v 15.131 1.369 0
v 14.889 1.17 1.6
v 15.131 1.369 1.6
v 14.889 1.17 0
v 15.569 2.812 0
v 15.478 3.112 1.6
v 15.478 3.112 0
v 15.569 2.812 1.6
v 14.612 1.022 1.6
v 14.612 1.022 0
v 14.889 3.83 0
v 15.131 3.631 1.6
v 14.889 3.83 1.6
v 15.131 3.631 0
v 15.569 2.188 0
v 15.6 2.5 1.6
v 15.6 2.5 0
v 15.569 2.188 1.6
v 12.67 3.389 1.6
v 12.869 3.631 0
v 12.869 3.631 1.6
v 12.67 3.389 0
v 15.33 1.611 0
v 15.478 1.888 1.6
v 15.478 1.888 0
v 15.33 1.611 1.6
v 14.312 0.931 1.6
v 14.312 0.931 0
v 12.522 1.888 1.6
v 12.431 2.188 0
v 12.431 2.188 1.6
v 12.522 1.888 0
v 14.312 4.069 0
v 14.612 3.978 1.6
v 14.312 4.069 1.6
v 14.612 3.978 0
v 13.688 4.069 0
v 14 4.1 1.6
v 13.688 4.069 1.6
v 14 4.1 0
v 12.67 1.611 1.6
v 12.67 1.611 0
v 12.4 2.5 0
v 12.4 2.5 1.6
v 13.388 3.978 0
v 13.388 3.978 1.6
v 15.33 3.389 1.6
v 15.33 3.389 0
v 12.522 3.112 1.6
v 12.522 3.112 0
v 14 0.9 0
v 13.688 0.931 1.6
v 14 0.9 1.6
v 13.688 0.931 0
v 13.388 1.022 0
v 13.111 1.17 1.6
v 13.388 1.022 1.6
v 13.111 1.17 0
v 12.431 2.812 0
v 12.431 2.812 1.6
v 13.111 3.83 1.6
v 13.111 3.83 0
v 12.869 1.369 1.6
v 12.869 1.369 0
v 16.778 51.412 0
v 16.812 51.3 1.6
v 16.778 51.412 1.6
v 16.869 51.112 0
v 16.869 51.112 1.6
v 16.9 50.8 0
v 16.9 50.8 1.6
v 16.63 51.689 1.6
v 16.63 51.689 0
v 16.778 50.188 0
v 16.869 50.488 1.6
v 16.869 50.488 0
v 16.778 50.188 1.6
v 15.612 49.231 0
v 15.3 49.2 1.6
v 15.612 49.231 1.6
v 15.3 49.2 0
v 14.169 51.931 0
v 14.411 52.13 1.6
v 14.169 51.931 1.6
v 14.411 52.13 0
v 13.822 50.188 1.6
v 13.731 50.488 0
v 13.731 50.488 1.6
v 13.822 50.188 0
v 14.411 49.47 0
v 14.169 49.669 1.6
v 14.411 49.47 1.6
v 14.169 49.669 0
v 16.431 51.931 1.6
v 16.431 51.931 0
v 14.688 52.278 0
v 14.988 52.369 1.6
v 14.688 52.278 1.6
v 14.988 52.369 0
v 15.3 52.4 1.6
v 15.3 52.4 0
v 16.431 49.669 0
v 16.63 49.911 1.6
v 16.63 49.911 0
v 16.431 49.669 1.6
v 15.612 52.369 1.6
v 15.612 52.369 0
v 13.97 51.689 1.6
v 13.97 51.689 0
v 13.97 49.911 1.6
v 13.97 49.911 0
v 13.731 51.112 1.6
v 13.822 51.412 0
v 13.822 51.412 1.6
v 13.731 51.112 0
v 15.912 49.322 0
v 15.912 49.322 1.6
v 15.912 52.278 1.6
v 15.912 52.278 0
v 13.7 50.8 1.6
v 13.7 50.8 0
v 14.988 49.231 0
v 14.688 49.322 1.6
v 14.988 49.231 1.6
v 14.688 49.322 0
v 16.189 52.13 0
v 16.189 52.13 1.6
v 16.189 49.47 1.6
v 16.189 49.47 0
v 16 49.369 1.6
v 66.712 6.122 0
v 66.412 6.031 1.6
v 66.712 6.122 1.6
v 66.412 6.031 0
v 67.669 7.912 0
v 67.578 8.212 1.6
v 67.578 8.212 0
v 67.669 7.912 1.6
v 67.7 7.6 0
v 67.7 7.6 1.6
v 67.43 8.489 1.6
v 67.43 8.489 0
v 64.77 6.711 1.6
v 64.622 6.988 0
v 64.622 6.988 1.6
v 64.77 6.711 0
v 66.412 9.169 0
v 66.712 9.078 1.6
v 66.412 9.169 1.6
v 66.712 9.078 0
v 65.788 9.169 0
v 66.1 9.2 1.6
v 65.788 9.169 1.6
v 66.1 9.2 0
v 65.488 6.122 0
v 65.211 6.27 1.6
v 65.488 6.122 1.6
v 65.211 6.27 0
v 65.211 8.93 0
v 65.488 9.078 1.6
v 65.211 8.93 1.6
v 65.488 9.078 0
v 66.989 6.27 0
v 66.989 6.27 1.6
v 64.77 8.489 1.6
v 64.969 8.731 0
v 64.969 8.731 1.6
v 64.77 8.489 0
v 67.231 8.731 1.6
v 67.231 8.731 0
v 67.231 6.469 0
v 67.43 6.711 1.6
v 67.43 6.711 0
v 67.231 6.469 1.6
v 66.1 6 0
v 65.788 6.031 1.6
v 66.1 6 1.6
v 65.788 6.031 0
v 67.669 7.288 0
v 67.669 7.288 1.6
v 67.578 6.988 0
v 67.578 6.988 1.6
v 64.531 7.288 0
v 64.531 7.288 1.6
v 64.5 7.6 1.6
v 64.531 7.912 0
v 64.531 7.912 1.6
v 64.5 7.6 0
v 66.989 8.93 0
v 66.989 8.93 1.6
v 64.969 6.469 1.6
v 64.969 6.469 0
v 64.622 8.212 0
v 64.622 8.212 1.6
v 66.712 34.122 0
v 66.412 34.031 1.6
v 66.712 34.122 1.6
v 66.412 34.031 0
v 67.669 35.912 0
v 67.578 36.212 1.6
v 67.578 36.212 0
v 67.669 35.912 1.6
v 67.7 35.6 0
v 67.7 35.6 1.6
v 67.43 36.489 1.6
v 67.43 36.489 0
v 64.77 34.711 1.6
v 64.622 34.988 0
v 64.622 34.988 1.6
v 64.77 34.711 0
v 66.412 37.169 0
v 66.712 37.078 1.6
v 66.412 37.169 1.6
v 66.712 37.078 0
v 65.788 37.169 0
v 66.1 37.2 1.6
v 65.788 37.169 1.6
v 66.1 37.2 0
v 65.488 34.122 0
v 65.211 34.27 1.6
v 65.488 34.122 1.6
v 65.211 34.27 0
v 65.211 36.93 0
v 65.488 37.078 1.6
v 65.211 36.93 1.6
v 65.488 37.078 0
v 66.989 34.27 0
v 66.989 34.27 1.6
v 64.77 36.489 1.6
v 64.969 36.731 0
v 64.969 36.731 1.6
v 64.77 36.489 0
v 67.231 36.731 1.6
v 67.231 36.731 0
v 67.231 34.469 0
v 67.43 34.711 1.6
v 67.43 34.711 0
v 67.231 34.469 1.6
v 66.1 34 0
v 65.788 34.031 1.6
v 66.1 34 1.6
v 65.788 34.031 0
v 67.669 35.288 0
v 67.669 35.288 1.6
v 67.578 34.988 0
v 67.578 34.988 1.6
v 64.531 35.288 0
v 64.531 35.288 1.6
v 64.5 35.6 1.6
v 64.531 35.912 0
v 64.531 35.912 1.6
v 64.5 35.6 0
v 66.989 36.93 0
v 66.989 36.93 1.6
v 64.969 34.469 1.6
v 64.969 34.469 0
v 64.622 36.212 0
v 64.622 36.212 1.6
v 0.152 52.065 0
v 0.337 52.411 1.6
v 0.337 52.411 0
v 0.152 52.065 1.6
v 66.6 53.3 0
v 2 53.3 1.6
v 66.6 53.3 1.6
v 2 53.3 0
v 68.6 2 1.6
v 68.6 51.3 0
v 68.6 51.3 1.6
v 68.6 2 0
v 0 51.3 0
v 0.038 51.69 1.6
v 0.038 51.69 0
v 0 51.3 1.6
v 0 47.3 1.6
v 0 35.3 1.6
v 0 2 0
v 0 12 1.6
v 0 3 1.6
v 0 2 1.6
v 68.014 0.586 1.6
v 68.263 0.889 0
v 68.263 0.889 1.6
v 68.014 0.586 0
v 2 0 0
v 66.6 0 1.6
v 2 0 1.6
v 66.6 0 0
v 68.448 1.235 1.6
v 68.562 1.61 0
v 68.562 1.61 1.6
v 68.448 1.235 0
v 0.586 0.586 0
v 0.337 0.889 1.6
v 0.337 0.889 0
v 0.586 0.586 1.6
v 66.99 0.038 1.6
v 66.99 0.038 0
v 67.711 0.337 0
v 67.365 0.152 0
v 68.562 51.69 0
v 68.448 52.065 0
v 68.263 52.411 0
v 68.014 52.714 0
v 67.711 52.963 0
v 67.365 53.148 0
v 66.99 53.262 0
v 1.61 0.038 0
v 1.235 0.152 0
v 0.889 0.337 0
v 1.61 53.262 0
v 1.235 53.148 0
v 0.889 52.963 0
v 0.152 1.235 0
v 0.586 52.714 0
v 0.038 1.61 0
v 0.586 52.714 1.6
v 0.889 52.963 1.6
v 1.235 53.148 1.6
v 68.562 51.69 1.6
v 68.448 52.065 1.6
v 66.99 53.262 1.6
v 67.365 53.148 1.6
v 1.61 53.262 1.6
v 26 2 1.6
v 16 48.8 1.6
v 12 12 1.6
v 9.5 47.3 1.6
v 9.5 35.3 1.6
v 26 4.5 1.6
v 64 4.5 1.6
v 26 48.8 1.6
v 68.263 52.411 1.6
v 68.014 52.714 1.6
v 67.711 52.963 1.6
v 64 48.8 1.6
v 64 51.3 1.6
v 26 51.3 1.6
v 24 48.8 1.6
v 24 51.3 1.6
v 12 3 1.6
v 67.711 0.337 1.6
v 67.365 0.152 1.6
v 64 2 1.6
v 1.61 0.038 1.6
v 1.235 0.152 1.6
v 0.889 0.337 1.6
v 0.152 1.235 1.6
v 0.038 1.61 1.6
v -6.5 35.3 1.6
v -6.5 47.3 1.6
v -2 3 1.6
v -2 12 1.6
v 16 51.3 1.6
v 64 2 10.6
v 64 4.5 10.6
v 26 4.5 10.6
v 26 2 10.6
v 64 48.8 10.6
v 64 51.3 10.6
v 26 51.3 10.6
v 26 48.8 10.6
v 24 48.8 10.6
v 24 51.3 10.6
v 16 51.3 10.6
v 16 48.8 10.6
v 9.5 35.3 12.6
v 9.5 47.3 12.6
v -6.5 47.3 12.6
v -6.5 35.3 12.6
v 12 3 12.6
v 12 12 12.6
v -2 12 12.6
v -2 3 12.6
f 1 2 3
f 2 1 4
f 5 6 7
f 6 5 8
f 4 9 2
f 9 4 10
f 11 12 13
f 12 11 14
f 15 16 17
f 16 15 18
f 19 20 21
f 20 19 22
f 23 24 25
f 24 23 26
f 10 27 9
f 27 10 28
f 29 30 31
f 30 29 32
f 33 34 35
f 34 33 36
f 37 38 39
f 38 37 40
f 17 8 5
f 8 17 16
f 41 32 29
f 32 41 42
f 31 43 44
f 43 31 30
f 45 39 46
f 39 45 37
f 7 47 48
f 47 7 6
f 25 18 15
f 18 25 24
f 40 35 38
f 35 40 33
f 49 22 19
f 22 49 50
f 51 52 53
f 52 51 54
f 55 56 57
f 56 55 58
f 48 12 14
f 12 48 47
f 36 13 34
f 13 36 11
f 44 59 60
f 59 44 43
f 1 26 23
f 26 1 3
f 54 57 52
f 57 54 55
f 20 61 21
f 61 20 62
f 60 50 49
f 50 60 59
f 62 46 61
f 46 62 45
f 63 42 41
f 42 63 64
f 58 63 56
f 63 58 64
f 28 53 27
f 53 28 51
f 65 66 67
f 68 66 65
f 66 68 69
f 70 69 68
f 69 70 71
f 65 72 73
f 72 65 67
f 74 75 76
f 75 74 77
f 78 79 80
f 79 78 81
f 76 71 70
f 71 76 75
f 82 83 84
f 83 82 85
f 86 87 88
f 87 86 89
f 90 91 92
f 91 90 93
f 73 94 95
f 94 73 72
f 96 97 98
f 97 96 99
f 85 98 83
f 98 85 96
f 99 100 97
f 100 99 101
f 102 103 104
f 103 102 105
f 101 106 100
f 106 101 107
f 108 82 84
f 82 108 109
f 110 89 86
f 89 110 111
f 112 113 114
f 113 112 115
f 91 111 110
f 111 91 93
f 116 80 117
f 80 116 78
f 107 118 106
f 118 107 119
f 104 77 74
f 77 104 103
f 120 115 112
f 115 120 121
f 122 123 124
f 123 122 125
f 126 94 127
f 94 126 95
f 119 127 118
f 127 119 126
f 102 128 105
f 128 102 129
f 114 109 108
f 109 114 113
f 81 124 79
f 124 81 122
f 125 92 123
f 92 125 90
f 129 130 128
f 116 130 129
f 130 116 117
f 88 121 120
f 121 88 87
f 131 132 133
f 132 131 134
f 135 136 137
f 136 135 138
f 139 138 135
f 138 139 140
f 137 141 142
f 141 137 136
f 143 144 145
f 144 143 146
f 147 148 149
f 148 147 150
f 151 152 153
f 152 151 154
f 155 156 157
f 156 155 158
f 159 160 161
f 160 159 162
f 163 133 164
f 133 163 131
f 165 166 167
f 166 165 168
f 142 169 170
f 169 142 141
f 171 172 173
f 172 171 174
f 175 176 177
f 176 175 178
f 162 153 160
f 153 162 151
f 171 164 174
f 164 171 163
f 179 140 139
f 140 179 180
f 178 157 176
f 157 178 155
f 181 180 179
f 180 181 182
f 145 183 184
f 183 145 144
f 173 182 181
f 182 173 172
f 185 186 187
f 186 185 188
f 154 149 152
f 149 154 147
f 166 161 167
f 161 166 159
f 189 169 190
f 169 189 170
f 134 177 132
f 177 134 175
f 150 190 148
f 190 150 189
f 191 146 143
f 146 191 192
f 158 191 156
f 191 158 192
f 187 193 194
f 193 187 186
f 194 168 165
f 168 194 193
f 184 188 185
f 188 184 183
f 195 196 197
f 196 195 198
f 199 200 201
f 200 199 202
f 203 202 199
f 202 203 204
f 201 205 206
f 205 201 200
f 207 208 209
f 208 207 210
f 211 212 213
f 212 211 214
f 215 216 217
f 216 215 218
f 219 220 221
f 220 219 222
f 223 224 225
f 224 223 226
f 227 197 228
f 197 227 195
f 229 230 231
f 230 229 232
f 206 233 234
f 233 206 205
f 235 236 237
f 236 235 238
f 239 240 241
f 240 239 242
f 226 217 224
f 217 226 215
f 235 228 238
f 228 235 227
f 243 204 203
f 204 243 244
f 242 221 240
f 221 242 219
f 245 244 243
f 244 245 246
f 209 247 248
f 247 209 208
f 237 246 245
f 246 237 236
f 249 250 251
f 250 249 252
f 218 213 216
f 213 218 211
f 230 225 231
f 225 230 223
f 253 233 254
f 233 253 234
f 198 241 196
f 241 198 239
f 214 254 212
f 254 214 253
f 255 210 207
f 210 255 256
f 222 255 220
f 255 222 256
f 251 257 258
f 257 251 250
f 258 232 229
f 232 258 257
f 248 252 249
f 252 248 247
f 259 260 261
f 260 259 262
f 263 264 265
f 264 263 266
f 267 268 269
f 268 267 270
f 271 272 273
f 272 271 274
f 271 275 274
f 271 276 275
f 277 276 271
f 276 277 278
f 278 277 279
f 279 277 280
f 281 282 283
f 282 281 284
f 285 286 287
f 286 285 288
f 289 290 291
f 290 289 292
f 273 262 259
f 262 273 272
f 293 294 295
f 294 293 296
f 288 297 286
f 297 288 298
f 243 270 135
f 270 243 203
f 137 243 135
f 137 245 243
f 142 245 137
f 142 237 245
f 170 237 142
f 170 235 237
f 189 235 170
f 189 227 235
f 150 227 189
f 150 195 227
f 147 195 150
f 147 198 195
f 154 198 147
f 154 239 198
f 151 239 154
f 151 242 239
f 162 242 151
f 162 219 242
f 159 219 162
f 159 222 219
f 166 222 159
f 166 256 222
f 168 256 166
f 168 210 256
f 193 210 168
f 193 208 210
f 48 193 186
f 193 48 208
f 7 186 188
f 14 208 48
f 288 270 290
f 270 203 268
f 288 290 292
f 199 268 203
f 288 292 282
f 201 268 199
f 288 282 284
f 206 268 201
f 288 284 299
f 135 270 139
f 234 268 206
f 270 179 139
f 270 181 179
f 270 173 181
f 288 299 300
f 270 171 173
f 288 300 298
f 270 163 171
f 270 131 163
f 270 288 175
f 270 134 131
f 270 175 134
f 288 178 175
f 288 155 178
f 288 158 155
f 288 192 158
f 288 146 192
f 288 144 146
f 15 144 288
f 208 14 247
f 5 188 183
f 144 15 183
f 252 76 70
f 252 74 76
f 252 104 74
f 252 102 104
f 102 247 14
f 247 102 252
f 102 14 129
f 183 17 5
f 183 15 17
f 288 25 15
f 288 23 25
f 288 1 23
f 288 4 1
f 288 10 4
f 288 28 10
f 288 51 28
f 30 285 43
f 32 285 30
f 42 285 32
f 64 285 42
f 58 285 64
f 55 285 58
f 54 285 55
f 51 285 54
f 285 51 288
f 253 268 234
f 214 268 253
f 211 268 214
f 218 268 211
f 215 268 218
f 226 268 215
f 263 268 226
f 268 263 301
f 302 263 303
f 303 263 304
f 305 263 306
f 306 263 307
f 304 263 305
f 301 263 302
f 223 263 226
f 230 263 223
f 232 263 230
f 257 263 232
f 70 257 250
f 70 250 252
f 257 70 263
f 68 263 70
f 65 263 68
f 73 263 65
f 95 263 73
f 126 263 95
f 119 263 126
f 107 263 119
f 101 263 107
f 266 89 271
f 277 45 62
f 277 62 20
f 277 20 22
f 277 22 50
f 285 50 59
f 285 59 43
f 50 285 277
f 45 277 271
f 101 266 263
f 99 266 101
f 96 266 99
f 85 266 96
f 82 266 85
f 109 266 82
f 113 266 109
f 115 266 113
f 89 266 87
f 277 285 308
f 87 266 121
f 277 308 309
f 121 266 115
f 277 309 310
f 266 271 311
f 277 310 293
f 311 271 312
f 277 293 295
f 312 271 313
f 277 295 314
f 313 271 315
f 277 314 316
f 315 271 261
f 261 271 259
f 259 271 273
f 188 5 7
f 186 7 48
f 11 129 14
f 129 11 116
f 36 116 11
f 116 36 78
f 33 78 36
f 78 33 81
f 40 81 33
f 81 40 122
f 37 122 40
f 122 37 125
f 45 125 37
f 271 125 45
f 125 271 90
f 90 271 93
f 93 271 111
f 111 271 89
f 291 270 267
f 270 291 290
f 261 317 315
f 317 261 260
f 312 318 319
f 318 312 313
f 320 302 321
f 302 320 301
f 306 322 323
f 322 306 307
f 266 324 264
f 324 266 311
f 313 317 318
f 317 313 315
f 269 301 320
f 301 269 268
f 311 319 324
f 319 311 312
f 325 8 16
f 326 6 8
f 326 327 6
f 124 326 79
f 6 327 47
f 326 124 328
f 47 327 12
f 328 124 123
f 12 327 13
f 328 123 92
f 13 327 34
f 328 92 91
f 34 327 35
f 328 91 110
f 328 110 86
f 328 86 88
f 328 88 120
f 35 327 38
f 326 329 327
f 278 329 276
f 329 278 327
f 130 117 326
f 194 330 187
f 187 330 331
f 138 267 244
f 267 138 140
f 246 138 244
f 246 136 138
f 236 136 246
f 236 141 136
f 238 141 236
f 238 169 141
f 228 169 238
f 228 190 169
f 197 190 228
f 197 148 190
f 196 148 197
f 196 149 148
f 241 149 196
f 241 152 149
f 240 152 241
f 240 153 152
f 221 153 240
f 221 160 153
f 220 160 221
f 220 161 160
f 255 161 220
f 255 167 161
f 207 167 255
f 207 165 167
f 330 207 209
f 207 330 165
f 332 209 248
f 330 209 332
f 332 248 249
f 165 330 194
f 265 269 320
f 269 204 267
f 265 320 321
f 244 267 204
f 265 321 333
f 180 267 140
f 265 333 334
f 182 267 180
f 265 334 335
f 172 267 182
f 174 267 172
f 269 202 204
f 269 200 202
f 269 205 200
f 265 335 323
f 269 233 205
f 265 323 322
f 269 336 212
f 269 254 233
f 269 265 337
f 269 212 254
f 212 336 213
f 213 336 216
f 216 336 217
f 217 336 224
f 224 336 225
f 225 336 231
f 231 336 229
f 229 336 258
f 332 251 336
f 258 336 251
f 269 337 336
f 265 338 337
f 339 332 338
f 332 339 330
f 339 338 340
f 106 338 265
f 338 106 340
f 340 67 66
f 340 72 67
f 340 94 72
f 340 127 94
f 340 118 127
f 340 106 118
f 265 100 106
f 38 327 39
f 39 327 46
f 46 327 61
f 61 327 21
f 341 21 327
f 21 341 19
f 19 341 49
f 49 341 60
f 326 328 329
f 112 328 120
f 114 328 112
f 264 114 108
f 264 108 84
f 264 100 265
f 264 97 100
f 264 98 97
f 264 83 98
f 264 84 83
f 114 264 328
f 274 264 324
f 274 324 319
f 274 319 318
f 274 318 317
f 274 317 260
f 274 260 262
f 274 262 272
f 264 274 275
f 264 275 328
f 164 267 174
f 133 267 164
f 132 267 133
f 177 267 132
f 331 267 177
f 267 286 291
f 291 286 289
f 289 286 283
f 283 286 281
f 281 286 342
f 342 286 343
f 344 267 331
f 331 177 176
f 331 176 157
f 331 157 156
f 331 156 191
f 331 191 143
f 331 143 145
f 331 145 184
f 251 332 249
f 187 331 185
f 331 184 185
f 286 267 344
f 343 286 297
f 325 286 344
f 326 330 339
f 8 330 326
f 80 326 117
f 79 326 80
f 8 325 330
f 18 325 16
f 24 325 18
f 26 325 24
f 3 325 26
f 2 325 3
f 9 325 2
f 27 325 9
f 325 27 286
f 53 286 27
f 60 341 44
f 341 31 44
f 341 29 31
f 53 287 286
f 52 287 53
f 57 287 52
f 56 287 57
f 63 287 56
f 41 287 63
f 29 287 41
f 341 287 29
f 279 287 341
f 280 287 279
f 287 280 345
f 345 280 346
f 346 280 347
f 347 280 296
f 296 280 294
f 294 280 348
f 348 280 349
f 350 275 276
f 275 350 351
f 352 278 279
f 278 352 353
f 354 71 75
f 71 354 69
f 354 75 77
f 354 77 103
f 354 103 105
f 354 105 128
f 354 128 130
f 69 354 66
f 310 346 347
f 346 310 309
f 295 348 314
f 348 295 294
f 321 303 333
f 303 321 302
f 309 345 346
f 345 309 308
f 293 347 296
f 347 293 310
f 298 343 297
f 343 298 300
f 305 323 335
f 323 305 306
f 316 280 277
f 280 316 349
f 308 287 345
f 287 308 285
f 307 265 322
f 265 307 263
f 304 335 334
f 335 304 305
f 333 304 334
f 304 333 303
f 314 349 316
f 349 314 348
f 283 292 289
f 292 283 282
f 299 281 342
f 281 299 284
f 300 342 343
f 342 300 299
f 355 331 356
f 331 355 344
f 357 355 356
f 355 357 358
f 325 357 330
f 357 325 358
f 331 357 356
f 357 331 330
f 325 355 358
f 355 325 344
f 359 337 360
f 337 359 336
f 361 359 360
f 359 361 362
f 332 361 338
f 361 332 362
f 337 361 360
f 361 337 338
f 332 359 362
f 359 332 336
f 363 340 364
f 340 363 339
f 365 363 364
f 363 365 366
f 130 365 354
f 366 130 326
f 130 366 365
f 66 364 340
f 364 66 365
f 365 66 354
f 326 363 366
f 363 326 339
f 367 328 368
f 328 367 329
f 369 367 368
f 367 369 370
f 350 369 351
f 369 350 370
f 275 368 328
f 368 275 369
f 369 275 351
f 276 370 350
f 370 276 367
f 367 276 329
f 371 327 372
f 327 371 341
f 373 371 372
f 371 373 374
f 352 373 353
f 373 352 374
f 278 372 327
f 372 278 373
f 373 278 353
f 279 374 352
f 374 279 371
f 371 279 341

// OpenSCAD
// --- Arduino Uno R3 Dimensions ---
pcb_width = 68.6;
pcb_depth = 53.3;
pcb_thick = 1.6;

// Mounting Hole Positions (relative to bottom-left corner)
// Standard Arduino mounting hole coordinates
holes = [
    [14.0, 2.5],   // Near DC Jack
    [15.3, 50.8],  // Near USB
    [66.1, 7.6],   // Bottom Right
    [66.1, 35.6]   // Top Right
];

$fn = 32;

// --- Render ---
arduino_uno_r3();

module arduino_uno_r3() {
    color("DarkCyan") {
        difference() {
            // Main PCB body with slightly rounded corners
            hull() {
                translate([2, 2, 0]) cylinder(h=pcb_thick, r=2);
                translate([pcb_width-2, 2, 0]) cylinder(h=pcb_thick, r=2);
                translate([pcb_width-2, pcb_depth-2, 0]) cylinder(h=pcb_thick, r=2);
                translate([2, pcb_depth-2, 0]) cylinder(h=pcb_thick, r=2);
            }
            
            // Mounting Holes (3.2mm for M3 screws)
            for(h = holes) {
                translate([h[0], h[1], -1]) 
                    cylinder(h=pcb_thick+2, d=3.2);
            }
        }
    }

    // USB Port (Silver)
    color("Silver")
        translate([-6.5, pcb_depth - 18, pcb_thick]) 
            cube([16, 12, 11]);

    // DC Power Jack (Black)
    color("Black")
        translate([-2, 3, pcb_thick]) 
            cube([14, 9, 11]);

    // Header Pins (Black)
    color("DimGray") {
        translate([26, 2, pcb_thick]) cube([38, 2.5, 9]); // Bottom rail
        translate([26, pcb_depth - 4.5, pcb_thick]) cube([38, 2.5, 9]); // Top rail 1
        translate([16, pcb_depth - 4.5, pcb_thick]) cube([8, 2.5, 9]);  // Top rail 2
    }
}
